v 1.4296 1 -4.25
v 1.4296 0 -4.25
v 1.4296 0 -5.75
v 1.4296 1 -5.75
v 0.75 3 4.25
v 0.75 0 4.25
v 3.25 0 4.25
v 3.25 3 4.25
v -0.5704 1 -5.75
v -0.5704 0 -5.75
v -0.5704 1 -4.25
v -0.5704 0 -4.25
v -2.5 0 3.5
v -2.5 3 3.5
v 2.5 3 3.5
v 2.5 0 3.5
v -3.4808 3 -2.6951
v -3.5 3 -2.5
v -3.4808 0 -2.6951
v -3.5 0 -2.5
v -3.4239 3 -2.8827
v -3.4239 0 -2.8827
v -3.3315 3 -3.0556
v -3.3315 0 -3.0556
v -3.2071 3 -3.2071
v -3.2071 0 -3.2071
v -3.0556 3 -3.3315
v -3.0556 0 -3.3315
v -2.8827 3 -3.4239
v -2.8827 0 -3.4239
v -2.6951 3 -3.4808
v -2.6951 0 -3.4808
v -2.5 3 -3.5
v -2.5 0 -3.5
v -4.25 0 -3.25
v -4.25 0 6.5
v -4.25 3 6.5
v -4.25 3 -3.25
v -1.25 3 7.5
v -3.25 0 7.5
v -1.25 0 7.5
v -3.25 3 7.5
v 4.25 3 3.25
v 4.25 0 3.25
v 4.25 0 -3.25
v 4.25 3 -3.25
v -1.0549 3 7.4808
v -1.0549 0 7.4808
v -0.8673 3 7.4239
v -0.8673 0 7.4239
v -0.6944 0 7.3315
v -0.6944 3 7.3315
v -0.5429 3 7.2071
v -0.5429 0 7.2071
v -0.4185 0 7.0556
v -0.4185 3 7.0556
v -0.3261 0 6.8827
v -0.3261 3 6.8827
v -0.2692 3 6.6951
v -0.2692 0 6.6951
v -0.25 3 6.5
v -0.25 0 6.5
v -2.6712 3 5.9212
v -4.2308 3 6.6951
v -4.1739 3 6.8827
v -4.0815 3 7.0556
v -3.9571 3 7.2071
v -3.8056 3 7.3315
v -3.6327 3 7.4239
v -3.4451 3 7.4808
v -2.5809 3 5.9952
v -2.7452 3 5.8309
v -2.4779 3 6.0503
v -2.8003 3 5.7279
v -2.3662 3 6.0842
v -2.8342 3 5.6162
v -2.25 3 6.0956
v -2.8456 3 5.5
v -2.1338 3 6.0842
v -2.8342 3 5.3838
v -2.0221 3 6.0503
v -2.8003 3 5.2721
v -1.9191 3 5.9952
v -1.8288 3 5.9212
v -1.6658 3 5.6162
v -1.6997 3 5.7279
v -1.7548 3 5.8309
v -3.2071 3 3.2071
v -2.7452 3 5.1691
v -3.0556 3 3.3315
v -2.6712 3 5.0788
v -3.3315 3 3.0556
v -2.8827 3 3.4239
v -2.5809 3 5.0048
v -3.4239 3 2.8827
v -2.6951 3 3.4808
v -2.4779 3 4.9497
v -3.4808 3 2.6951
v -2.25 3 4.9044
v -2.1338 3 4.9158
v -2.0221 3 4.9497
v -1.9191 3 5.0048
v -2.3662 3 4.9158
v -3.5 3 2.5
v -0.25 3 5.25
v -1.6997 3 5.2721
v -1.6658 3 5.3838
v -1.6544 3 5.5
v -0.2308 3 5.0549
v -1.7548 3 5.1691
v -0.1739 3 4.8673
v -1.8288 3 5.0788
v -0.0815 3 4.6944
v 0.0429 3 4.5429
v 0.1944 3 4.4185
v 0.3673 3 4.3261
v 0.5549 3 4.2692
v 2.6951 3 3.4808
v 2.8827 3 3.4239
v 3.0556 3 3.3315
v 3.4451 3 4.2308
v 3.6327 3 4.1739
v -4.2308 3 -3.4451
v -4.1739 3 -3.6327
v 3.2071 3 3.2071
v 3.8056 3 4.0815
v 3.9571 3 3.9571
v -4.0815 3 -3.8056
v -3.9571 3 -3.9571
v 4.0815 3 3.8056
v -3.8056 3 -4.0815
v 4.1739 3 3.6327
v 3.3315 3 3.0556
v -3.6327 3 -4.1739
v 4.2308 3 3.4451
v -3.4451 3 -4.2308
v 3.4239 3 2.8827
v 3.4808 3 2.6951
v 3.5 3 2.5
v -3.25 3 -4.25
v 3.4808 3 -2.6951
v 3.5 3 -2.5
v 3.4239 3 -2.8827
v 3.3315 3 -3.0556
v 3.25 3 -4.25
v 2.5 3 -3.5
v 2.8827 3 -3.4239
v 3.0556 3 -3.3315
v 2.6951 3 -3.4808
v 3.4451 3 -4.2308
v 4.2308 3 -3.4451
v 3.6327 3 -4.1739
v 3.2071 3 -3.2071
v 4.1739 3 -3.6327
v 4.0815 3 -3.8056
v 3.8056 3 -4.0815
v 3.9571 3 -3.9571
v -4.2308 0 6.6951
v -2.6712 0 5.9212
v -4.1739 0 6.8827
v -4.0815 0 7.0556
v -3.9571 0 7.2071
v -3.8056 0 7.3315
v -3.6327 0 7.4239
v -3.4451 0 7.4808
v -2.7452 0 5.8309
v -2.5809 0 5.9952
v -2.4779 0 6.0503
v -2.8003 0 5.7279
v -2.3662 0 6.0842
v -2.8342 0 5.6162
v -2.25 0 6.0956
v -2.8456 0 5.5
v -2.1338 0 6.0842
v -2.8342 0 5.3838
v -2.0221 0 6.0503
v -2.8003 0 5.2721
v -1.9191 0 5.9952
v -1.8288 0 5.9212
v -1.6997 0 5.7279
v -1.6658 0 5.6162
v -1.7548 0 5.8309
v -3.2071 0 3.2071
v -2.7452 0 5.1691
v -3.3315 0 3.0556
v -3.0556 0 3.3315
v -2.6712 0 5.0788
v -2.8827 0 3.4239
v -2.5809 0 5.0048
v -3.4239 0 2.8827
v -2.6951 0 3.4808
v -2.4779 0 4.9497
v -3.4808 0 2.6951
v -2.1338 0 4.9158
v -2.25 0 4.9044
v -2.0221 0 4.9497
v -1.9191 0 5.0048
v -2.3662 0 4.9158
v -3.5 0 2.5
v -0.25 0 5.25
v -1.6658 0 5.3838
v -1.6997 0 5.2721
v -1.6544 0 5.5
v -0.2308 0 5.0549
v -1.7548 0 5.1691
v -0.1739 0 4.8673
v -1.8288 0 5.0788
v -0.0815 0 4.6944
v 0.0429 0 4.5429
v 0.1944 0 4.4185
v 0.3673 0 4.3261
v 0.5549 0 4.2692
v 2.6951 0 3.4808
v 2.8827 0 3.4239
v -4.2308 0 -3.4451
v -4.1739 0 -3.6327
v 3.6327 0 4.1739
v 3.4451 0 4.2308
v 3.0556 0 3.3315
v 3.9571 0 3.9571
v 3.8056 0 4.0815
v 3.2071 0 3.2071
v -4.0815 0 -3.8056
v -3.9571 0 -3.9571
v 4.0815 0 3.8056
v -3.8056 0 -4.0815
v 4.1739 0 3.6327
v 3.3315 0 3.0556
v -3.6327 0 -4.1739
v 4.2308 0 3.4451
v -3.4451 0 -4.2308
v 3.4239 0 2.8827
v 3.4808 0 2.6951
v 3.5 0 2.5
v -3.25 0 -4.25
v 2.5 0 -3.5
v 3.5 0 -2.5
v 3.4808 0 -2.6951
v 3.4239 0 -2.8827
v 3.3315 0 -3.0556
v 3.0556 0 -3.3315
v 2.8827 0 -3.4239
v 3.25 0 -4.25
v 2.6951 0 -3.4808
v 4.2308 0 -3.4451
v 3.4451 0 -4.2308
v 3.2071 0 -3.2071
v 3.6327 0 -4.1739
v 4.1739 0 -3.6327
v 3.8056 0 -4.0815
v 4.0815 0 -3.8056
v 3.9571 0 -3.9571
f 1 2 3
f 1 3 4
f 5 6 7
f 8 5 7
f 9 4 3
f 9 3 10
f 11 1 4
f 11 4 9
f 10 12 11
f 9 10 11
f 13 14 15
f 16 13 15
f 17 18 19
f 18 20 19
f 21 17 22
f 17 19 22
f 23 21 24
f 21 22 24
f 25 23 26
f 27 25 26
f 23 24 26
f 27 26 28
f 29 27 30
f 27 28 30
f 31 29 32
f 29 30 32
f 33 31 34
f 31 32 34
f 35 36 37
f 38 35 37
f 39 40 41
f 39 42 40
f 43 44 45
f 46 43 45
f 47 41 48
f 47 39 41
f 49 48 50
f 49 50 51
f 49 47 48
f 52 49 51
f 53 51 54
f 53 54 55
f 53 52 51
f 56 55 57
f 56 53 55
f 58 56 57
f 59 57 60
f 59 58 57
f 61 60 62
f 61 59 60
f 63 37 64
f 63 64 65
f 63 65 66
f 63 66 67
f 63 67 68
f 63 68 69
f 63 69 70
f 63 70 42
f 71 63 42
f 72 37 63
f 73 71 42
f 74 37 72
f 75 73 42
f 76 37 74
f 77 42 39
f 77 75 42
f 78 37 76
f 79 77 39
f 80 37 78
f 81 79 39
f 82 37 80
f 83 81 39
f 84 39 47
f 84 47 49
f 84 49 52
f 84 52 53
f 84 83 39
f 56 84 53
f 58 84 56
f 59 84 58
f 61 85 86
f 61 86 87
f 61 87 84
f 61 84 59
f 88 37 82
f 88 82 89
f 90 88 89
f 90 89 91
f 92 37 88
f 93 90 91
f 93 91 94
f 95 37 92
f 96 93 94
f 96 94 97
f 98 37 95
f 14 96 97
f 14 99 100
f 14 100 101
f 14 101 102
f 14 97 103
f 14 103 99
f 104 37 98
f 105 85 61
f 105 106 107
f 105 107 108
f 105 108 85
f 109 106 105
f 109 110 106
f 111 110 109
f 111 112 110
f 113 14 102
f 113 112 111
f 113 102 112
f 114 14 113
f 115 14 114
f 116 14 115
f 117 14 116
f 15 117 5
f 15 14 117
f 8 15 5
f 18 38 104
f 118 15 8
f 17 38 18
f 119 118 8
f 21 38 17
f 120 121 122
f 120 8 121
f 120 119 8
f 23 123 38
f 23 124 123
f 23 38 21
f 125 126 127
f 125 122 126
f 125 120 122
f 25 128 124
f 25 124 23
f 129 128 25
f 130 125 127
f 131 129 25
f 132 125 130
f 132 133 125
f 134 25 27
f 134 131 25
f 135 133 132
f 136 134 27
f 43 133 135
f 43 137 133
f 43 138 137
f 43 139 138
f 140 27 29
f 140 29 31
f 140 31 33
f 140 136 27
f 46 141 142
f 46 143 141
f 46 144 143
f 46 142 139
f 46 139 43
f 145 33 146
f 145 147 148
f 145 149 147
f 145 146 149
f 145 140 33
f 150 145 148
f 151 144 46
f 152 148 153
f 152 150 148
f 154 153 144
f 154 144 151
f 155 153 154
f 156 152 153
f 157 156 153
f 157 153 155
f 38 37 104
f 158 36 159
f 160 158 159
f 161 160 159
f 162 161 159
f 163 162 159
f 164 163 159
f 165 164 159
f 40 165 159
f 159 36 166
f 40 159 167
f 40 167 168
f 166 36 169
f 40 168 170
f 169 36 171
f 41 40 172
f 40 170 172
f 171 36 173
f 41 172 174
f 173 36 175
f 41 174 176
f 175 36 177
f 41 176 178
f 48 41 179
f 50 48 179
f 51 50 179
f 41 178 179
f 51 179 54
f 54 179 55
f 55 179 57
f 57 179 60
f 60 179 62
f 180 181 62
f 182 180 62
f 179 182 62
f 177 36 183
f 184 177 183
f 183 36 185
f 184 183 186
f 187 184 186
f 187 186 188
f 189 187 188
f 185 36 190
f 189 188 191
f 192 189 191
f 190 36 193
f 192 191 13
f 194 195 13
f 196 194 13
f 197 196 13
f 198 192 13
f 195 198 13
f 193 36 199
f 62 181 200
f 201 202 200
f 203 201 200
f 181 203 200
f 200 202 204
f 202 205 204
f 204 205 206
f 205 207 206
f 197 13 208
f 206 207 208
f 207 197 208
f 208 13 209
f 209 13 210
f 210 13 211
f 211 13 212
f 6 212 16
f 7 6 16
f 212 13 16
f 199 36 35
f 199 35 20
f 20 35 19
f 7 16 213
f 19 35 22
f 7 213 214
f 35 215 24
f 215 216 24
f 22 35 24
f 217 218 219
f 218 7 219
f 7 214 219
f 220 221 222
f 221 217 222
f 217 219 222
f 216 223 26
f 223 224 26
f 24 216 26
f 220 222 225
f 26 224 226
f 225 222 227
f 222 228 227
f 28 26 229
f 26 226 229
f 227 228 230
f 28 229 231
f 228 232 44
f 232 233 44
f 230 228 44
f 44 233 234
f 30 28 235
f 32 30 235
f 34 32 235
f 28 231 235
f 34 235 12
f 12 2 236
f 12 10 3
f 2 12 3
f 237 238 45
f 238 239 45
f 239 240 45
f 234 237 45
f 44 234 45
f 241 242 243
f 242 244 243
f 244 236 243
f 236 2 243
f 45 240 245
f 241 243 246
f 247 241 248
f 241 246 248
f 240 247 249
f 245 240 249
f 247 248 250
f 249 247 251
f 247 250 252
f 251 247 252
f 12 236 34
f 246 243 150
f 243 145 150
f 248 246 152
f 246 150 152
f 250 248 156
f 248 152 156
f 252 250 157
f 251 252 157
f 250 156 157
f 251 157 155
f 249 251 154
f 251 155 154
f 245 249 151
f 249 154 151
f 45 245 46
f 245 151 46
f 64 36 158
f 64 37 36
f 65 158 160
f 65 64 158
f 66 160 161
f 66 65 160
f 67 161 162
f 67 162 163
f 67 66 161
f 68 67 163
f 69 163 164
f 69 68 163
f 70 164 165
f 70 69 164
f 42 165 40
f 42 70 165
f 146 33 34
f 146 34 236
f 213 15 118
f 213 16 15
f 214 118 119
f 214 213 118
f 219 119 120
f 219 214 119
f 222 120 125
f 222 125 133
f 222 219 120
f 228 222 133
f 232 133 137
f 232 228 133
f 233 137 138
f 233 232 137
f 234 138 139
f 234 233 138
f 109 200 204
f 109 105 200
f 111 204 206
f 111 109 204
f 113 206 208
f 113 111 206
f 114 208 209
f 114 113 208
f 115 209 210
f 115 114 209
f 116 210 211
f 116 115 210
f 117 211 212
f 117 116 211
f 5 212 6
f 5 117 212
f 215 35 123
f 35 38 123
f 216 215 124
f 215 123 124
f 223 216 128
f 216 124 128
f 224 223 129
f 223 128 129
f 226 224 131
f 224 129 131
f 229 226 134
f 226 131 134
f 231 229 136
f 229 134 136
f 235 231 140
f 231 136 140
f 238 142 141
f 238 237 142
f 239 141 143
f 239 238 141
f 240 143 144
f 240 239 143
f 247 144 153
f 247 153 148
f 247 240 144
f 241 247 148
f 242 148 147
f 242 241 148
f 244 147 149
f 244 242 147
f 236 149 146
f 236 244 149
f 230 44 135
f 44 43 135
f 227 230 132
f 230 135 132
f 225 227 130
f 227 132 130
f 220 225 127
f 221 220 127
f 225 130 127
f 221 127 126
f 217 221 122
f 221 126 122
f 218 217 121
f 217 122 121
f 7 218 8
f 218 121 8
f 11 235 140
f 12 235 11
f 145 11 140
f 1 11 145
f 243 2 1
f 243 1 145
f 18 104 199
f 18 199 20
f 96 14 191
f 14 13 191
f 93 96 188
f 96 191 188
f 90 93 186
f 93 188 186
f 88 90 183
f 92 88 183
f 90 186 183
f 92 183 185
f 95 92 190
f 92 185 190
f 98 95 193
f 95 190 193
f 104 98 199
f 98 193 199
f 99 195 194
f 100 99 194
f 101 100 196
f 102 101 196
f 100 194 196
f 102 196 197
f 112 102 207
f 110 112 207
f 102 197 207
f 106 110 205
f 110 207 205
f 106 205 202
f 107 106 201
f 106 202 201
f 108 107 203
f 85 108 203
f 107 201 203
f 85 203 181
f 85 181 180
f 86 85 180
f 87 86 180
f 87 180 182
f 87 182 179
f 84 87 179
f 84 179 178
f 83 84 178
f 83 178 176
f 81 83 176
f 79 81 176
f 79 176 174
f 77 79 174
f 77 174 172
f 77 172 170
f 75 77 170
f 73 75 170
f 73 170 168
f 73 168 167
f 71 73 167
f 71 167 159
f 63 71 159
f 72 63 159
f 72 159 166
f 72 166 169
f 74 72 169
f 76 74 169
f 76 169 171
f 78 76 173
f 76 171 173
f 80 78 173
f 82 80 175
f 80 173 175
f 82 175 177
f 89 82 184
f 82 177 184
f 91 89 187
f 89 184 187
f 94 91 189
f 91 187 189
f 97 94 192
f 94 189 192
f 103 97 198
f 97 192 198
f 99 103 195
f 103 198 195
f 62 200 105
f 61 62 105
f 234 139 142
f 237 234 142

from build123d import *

# Parameters (mm, degrees)
SKETCH1_W             = 8.5
SKETCH1_H             = 8.5
EXTRUDE1_DEPTH        = 3
SKETCH3_W             = 4
SKETCH3_H             = 3
EXTRUDE3_DEPTH        = 3.25
SKETCH2_W             = 7
SKETCH2_H             = 7
EXTRUDE2_DEPTH        = 4
F_0_80_TAPPED_HOLE1_D = 1.19126
SKETCH11_W            = 2
SKETCH11_H            = 1
EXTRUDE5_DEPTH        = 1.5
FILLET1_R             = 1


with BuildPart() as part:
    # Sketch1 → Extrude1 (new body)
    with BuildSketch(Plane(origin=(0, 0, 0), x_dir=(1, 0, 0), z_dir=(0, 1, 0))):
        Rectangle(SKETCH1_W, SKETCH1_H)
    extrude(amount=EXTRUDE1_DEPTH)

    # Sketch3 → Extrude3 (add)
    with BuildSketch(Plane.XY.offset(4.25)):
        with Locations((-2.25, 1.5)):
            Rectangle(SKETCH3_W, SKETCH3_H)
    extrude(amount=EXTRUDE3_DEPTH)

    # Sketch2 → Extrude2 (cut, through all)
    with BuildSketch(Plane(origin=(0, 3, 0), x_dir=(1, 0, 0), z_dir=(0, 1, 0))):
        Rectangle(SKETCH2_W, SKETCH2_H)
    extrude(amount=-EXTRUDE2_DEPTH, mode=Mode.SUBTRACT)

    # #0-80 Tapped Hole1 (through all)
    with Locations(Plane(origin=(-2.25, 3, 5.5), x_dir=(0, 0, 1), z_dir=(0, 1, 0))):
        with Locations((0, 0)):
            Hole(F_0_80_TAPPED_HOLE1_D / 2)

    # Sketch11 → Extrude5 (add)
    with BuildSketch(Plane(origin=(0, 0, -4.25), x_dir=(-1, 0, 0), z_dir=(0, 0, -1))):
        with Locations((-0.42960296, 0.5)):
            Rectangle(SKETCH11_W, SKETCH11_H)
    extrude(amount=EXTRUDE5_DEPTH)

    # Fillet1
    fillet1_edges = [part.edges().sort_by_distance(p)[0] for p in [
        (3.5, 1.5, -3.5),
        (-3.5, 1.5, -3.5),
        (-3.5, 1.5, 3.5),
        (3.5, 1.5, 3.5),
        (-4.25, 1.5, 7.5),
        (-0.25, 1.5, 7.5),
        (-0.25, 1.5, 4.25),
        (4.25, 1.5, 4.25),
        (4.25, 1.5, -4.25),
        (-4.25, 1.5, -4.25),
    ]]
    fillet(fillet1_edges, radius=FILLET1_R)


solid = part.part
